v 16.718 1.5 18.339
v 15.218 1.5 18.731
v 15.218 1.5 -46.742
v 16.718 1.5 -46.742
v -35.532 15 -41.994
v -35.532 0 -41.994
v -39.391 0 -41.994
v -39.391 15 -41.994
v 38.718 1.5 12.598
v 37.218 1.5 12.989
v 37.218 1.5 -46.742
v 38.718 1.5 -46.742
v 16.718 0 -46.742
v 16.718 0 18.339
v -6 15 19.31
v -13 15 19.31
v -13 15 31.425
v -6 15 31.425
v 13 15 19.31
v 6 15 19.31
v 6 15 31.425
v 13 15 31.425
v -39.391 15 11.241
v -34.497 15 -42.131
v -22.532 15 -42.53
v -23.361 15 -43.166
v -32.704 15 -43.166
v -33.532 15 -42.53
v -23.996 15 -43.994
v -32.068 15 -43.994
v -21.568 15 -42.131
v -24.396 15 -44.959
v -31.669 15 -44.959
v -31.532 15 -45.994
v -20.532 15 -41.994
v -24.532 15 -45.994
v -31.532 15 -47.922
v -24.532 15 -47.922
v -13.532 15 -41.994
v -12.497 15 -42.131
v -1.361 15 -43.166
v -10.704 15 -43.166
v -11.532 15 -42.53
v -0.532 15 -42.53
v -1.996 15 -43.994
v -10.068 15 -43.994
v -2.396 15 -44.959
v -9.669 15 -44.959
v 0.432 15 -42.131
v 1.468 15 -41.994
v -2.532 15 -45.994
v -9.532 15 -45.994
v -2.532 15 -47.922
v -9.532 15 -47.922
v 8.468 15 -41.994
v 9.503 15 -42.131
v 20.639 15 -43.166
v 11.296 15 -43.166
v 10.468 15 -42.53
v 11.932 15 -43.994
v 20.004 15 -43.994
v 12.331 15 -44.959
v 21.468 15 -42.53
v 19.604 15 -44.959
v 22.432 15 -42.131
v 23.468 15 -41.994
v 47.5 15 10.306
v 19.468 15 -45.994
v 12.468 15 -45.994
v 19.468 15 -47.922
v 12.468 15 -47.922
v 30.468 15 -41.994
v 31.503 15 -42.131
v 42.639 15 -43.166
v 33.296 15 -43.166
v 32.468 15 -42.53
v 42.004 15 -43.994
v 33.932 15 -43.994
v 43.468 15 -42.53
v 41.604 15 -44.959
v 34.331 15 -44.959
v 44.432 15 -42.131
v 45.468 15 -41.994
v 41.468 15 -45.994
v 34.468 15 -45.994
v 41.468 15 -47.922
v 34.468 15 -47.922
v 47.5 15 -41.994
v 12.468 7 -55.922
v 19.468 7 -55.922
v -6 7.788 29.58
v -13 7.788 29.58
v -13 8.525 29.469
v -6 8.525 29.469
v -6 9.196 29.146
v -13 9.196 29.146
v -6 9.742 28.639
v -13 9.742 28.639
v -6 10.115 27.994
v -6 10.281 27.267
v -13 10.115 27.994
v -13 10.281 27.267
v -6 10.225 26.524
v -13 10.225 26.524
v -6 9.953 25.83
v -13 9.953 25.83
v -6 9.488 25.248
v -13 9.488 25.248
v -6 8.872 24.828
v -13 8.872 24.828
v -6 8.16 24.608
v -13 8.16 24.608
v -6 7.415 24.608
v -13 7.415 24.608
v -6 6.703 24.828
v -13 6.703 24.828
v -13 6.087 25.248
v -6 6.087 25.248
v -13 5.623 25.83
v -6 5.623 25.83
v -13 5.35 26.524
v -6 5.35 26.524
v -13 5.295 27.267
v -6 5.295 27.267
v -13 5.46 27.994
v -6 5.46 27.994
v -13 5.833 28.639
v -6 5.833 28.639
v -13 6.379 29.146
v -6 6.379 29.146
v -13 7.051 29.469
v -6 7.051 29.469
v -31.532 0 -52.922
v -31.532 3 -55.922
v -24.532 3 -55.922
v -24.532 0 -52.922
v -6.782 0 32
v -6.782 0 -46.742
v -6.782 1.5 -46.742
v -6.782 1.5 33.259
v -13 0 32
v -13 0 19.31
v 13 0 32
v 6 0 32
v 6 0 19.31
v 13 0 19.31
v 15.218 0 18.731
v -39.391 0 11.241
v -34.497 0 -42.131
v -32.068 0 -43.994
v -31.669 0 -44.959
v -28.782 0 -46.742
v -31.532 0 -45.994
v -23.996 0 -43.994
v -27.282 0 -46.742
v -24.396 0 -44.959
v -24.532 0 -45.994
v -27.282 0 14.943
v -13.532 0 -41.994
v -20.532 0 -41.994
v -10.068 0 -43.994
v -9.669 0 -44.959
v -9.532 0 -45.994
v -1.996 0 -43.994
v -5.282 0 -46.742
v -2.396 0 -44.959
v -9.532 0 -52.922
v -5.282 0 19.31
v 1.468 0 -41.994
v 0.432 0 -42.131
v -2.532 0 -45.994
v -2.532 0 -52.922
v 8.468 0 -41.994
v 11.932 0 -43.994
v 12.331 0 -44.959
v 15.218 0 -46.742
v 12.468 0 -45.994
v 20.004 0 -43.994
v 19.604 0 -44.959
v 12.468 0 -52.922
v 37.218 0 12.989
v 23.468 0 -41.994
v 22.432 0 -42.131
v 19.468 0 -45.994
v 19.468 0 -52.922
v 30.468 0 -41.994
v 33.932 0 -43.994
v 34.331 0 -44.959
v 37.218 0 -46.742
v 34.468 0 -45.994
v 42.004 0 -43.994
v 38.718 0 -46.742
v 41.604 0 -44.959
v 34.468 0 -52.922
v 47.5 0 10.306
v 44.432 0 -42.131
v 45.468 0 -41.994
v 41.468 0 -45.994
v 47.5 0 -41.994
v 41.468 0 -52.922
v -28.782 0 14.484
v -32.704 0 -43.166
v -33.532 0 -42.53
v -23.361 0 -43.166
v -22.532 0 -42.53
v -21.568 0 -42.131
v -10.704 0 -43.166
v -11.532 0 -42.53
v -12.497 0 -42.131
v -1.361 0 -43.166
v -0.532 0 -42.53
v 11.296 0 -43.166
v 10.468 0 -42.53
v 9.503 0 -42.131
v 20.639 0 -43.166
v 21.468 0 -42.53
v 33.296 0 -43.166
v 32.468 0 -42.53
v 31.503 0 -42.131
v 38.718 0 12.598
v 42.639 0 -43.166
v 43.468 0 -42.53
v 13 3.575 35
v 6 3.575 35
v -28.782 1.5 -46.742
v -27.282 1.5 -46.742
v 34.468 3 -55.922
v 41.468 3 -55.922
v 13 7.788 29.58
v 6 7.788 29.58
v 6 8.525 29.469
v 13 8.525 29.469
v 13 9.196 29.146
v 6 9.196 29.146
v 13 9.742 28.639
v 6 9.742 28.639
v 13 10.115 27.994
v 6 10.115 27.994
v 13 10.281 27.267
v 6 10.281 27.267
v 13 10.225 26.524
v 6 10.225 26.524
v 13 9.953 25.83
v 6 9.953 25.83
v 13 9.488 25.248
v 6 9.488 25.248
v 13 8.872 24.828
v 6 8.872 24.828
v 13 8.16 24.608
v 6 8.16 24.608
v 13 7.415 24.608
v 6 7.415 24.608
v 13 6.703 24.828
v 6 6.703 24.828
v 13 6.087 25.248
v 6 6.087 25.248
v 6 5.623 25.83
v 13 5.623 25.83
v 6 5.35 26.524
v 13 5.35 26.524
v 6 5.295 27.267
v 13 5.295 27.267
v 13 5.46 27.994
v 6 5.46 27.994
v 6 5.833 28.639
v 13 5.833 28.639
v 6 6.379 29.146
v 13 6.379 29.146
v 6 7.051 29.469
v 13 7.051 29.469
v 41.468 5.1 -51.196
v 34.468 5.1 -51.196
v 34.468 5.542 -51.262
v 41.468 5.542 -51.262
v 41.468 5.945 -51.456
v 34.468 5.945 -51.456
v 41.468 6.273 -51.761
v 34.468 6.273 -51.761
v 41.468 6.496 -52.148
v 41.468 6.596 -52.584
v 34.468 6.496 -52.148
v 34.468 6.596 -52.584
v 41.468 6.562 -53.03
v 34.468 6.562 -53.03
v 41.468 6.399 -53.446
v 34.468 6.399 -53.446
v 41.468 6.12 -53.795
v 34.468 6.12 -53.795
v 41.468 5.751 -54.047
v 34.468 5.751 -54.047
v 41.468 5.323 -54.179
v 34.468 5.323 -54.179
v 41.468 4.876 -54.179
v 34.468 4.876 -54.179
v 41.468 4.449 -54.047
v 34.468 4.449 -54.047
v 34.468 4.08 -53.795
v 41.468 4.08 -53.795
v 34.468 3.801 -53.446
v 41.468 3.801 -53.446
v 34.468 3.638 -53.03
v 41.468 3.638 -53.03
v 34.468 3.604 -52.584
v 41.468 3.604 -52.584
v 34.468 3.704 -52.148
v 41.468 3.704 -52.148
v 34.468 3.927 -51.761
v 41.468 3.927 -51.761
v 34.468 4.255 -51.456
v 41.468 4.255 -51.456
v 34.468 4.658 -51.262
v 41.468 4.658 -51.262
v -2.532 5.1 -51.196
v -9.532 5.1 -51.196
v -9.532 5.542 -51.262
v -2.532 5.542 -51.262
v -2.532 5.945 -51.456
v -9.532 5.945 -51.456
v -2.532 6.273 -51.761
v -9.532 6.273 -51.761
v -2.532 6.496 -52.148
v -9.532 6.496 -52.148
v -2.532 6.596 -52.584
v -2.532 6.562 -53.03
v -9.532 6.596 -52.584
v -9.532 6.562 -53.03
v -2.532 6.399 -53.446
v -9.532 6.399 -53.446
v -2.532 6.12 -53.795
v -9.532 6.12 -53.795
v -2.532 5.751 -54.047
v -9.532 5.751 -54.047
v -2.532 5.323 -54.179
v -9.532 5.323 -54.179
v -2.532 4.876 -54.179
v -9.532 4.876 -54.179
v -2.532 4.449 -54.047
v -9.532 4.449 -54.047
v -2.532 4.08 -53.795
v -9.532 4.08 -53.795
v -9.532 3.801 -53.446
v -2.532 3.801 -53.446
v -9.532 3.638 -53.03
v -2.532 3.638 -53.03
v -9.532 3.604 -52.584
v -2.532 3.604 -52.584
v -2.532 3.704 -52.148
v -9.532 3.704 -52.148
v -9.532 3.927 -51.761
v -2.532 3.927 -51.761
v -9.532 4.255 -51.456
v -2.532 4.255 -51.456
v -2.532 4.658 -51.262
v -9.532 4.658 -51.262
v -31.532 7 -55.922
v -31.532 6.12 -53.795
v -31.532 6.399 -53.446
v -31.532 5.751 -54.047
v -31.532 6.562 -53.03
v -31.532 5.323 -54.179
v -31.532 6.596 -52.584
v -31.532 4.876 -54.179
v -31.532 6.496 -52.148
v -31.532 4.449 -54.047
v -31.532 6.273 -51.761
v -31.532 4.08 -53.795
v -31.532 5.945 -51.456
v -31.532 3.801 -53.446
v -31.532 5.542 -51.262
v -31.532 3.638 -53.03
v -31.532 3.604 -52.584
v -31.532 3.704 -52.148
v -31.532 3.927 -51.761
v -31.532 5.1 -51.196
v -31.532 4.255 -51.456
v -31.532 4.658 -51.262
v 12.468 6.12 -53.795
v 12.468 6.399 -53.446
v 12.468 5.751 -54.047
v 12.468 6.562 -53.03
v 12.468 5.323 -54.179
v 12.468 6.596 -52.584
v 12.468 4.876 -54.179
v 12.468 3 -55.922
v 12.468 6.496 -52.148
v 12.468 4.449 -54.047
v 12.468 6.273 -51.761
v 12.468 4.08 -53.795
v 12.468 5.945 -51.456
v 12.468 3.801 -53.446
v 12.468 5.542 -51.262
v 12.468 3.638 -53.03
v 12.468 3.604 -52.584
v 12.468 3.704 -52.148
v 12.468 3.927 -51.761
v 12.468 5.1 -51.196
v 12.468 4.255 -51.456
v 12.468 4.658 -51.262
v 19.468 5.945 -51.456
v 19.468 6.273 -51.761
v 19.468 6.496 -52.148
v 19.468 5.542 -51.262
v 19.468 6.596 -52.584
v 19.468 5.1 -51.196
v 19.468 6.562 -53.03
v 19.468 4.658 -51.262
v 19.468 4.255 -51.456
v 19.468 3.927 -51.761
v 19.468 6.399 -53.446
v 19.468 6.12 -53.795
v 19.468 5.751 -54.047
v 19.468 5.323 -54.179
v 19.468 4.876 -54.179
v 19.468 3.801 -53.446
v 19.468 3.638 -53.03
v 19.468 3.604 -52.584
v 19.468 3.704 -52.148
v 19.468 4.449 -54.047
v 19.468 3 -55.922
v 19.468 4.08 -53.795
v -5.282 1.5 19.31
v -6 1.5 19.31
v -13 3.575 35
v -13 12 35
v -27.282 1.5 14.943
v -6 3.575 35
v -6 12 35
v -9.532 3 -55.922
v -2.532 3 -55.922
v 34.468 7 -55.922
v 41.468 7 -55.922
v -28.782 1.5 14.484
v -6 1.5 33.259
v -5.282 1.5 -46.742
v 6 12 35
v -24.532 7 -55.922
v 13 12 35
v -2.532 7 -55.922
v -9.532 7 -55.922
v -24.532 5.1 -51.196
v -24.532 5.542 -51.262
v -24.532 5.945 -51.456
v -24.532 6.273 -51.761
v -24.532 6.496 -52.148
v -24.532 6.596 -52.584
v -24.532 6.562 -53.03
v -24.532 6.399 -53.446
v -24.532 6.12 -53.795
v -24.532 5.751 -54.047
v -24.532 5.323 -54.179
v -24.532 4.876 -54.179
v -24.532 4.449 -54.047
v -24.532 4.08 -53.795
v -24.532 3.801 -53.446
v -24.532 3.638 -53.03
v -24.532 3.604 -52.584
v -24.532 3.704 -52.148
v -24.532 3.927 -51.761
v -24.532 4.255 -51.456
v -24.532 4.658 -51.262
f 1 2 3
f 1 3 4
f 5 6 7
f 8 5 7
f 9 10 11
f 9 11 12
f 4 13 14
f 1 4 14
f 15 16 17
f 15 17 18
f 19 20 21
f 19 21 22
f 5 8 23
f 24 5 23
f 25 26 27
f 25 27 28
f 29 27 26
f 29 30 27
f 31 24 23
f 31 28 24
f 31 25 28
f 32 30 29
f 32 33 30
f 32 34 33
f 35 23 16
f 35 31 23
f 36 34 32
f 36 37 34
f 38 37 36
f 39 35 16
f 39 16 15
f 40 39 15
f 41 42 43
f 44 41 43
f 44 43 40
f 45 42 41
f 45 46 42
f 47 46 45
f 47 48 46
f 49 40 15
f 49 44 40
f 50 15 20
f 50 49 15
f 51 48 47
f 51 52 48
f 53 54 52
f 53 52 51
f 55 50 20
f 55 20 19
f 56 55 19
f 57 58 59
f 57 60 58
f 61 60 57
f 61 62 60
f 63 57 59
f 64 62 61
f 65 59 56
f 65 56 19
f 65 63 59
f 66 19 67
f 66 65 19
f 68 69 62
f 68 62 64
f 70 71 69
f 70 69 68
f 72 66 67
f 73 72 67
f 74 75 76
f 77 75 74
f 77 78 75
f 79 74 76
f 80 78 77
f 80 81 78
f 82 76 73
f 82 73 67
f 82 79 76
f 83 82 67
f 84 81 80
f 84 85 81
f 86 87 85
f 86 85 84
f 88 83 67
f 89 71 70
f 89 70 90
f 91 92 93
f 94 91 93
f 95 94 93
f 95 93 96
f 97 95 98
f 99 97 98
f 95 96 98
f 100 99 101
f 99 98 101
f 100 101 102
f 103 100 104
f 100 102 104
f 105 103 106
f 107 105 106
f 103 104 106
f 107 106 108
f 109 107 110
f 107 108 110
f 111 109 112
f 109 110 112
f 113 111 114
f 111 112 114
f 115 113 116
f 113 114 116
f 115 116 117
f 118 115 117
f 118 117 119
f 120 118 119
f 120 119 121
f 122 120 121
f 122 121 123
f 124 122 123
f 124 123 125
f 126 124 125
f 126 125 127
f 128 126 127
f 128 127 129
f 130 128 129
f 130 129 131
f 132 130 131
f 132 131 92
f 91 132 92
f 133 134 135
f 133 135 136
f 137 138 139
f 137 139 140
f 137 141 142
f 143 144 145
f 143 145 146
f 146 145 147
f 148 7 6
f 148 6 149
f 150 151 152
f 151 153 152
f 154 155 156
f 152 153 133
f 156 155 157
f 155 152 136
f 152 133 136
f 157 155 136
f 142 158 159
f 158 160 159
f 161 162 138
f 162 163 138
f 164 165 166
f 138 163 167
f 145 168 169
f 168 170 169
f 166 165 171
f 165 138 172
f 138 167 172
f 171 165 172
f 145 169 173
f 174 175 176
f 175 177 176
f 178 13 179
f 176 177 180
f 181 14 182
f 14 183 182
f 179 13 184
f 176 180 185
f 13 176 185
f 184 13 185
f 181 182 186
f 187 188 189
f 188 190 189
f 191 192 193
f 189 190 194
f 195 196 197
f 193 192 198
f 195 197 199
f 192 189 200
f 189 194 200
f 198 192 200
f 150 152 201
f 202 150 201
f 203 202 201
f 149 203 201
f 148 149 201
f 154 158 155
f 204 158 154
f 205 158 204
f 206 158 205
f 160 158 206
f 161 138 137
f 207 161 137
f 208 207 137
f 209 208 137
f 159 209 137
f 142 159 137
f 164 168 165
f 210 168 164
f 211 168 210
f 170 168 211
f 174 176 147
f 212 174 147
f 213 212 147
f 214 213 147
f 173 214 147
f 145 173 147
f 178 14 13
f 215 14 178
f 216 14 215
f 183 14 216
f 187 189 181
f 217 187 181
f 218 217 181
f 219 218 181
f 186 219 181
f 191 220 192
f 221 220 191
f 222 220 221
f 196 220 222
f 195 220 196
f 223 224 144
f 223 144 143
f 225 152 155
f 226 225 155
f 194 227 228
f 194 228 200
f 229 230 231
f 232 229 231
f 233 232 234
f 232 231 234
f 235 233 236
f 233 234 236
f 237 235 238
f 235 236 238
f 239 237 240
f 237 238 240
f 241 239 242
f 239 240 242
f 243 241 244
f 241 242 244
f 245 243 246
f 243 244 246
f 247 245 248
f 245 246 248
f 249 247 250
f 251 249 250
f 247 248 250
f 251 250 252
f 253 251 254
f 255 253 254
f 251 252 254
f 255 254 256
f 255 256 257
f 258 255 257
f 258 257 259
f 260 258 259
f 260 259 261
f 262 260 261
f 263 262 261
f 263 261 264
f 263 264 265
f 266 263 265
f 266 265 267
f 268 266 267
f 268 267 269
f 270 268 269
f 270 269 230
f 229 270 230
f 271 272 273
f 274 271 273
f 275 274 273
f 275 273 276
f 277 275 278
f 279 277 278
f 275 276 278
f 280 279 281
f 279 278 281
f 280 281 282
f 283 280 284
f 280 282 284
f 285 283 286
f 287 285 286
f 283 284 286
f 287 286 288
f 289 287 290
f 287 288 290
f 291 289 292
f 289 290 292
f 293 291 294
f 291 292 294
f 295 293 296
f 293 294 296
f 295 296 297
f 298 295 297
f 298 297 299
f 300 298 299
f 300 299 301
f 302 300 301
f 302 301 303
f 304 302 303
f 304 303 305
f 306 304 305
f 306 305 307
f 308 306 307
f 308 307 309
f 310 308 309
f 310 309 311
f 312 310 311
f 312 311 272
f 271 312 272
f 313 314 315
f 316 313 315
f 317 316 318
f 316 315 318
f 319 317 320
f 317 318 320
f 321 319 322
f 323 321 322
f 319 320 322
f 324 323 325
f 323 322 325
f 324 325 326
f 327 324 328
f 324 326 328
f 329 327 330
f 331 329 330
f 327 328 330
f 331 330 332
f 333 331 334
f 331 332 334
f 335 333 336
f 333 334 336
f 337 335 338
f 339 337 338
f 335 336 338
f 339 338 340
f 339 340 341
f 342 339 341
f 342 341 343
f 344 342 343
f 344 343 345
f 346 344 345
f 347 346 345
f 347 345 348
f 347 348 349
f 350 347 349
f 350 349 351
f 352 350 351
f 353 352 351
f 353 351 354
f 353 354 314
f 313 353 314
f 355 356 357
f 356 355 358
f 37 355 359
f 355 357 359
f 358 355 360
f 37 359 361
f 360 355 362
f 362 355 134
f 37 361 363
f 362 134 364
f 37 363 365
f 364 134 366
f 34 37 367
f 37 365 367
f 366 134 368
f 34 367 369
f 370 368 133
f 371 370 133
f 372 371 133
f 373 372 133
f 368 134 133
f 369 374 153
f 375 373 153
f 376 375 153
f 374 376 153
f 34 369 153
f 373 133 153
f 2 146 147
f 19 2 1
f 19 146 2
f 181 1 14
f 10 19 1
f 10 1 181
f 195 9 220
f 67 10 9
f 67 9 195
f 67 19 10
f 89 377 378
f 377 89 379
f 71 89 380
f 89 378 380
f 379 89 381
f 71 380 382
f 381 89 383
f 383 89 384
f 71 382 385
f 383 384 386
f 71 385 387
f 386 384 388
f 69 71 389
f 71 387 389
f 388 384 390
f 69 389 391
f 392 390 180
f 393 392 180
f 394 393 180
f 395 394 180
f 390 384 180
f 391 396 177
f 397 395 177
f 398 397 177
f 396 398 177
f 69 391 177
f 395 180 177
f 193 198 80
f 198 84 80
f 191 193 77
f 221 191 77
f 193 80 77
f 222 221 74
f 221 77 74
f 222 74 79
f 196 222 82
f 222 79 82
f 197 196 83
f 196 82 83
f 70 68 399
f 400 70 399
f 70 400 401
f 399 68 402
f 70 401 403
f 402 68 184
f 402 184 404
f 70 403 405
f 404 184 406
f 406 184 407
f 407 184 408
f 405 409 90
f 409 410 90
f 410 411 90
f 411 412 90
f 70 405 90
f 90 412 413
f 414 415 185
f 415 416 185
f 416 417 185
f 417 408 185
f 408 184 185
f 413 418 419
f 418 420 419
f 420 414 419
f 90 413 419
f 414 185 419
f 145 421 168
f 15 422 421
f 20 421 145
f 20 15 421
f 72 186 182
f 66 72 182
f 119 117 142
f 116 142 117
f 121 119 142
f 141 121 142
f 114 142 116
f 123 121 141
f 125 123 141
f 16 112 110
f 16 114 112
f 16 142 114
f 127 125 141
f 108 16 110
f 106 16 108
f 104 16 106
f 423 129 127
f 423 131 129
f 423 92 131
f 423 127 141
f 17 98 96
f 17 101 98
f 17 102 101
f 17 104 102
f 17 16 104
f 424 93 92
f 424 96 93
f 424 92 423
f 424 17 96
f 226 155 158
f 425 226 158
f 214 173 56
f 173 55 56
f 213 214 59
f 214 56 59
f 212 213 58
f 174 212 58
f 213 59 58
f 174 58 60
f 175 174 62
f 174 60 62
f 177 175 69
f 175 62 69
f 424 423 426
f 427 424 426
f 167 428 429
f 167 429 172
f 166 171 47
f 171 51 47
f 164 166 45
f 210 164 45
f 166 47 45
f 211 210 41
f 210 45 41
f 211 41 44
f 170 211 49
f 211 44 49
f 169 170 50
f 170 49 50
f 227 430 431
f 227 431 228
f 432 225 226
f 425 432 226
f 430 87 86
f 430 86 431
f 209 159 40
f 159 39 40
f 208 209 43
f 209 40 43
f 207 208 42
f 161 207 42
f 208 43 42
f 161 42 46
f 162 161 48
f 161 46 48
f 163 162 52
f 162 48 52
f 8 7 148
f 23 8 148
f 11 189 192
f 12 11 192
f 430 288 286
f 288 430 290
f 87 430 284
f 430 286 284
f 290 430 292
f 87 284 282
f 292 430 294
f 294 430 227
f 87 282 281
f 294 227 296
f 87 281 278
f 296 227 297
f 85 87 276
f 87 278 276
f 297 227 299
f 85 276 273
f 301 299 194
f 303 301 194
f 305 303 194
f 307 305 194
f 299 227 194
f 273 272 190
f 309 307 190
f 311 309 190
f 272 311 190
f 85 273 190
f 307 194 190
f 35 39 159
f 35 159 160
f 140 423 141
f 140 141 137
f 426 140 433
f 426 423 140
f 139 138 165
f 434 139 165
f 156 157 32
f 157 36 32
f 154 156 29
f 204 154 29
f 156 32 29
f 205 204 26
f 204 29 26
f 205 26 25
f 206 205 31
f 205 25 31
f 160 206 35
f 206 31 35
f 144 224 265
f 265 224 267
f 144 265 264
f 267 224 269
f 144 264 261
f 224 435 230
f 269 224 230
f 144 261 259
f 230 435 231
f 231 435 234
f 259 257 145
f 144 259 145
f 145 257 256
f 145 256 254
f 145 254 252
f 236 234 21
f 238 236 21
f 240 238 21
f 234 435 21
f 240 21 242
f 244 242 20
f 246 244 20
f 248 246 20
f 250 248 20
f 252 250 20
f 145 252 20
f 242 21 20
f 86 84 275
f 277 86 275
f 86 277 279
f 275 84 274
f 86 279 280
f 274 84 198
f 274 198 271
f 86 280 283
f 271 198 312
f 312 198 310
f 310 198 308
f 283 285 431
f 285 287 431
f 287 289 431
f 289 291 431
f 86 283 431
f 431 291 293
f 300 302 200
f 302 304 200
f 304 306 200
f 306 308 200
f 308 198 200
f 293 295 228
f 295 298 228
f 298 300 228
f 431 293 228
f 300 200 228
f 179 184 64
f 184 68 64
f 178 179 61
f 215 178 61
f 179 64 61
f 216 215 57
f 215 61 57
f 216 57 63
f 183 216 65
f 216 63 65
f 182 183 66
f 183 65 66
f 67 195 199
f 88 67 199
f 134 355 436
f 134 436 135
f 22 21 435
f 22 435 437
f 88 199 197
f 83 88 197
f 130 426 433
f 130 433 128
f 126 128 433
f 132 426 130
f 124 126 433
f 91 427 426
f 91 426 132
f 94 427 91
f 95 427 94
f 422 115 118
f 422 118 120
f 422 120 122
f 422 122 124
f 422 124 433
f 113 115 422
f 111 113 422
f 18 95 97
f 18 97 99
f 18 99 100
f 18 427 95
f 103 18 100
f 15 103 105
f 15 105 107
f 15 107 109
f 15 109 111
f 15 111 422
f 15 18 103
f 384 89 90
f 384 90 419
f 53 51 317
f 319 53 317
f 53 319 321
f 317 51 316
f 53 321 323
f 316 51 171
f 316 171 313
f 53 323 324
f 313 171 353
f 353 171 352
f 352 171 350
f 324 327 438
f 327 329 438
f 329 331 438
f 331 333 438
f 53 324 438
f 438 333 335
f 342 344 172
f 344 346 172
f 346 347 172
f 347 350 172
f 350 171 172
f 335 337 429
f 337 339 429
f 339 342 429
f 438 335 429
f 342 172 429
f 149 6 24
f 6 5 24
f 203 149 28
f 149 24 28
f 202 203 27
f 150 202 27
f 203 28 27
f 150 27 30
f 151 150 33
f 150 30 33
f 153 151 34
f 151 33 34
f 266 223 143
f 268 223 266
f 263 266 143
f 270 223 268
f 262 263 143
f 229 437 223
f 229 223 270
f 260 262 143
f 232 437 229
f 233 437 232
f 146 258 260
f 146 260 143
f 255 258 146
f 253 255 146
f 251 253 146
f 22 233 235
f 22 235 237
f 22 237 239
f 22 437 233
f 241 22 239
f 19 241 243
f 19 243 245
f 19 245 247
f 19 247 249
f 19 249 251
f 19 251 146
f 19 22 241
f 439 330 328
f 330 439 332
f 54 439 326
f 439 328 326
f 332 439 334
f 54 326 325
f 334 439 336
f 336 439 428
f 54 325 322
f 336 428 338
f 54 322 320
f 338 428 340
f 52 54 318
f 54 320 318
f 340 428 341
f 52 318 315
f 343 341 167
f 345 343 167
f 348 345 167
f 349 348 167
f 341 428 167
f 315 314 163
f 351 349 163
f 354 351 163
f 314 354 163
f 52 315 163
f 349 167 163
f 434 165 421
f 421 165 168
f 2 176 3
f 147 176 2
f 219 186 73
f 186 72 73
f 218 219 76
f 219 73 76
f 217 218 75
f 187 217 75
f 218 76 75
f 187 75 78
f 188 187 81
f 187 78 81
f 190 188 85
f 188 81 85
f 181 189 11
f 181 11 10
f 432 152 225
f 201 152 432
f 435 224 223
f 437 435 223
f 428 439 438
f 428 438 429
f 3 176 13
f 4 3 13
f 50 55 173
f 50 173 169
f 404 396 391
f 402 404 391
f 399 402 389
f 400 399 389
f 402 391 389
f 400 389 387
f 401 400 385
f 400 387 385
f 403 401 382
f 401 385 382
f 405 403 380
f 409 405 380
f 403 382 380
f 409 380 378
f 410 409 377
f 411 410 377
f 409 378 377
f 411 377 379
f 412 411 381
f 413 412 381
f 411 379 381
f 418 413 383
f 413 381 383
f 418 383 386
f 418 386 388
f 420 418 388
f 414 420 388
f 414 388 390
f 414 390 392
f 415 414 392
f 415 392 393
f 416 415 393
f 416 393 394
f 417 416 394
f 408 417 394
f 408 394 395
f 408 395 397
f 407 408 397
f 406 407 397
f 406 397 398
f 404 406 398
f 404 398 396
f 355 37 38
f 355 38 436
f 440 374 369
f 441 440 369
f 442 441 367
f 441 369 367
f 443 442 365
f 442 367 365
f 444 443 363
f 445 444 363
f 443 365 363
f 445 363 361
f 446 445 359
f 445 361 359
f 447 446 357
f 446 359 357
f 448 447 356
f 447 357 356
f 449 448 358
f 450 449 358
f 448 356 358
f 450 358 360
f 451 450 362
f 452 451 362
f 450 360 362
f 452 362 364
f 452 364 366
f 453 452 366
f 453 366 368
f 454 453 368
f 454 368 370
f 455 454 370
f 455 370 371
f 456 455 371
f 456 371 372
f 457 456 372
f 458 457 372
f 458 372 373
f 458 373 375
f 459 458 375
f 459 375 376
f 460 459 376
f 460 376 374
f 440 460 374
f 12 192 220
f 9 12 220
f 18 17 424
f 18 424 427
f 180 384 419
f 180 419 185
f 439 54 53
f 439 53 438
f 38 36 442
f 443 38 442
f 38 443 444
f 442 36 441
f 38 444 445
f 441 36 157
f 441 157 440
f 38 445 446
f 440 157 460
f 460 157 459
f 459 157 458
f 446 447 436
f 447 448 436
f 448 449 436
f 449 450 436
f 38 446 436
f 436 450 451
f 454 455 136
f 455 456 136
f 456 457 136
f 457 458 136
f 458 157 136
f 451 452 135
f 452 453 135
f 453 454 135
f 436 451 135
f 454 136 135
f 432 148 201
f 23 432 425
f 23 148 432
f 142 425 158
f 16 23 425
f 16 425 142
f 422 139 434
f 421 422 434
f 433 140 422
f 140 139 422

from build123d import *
from OCP.BRepFilletAPI import BRepFilletAPI_MakeChamfer

# Parameters (mm, degrees)
EXTRUDE_1_DEPTH       = 15
SKETCH_2_W            = 12
SKETCH_2_H            = 31.380738368
CUT_EXTRUDE_2_DEPTH   = 78.211371281
CHAMFER_1_SIZE        = 3
CHAMFER_1_SIZE2       = 3.575260778
SKETCH_4_R            = 2.5
CUT_EXTRUDE_3_DEPTH   = 86.823049672
SKETCH_8_R            = 1.5
CUT_EXTRUDE_3_2_DEPTH = 100.757006451
CUT_EXTRUDE_4_DEPTH   = 100.757006451
SKETCH_11_W           = 1.5
SKETCH_11_H           = 83.943010544
SKETCH_11_H_2         = 90.462059893
CUT_EXTRUDE_6_DEPTH   = 1.5
FILLET_7_R            = 4


with BuildPart() as part:
    # Эскиз1 → Вытянуть1 (new body)
    with BuildSketch(Plane(origin=(0, 0, 0), x_dir=(1, 0, 0), z_dir=(0, 1, 0))):
        Polygon((-39.391292545, -35), (47.5, -35), (47.5, 41.994456138), (41.467636093, 41.994456138), (41.467636093, 58.994456138), (34.467636093, 58.994456138), (34.467636093, 41.994456138), (19.467636417, 41.994456138), (19.467636417, 58.994456138), (12.467636275, 58.994456138), (12.467636275, 41.994456138), (-2.532363543, 41.994456138), (-2.532363543, 58.994456138), (-9.532363543, 58.994456138), (-9.532363543, 41.994456138), (-24.532363361, 41.994456138), (-24.532363361, 58.994456138), (-31.532363503, 58.994456138), (-31.532363503, 41.994456138), (-39.391292545, 41.994456138), align=None)
    extrude(amount=EXTRUDE_1_DEPTH)

    # Эскиз2 → Вытянуть2 (cut, through all)
    with BuildSketch(Plane(origin=(0, 15, 0), x_dir=(1, 0, 0), z_dir=(0, 1, 0))):
        with Locations((0, -35)):
            Rectangle(SKETCH_2_W, SKETCH_2_H)
        Polygon((-40.282255649, -10.968321), (-13, -19.309630816), (-13, -35), (-40.282255649, -35), align=None)
        Polygon((49.575798338, -35), (13, -35), (13, -19.309630816), (49.575798338, -9.764075531), align=None)
    extrude(amount=-CUT_EXTRUDE_2_DEPTH, mode=Mode.SUBTRACT)

    # Фаска1: one chamfer whose edges measure the first distance from different faces: ONE call of the kernel's chamfer builder (chamfer() names one face for all edges)
    chamfer_1_edges_1 = [part.edges().sort_by_distance(p)[0] for p in [
        (9.5, 0, 35),
        (-9.5, 0, 35),
    ]]
    chamfer_1_side_1 = [part.faces().sort_by_distance(p)[0] for p in [
        (3.754326558, 0, -14.37188085),
    ]]
    chamfer_1_edges_2 = [part.edges().sort_by_distance(p)[0] for p in [
        (9.5, 15, 35),
    ]]
    chamfer_1_side_2 = [part.faces().sort_by_distance(p)[0] for p in [
        (9.5, 7.5, 35),
    ]]
    chamfer_1_edges_3 = [part.edges().sort_by_distance(p)[0] for p in [
        (-9.5, 15, 35),
    ]]
    chamfer_1_side_3 = [part.faces().sort_by_distance(p)[0] for p in [
        (-9.5, 7.5, 35),
    ]]
    chamfer_1 = BRepFilletAPI_MakeChamfer(part.part.solid().wrapped)
    for e in chamfer_1_edges_1:
        chamfer_1.Add(CHAMFER_1_SIZE, CHAMFER_1_SIZE2, e.wrapped, chamfer_1_side_1[0].wrapped)  # the first distance lies on this face
    for e in chamfer_1_edges_2:
        chamfer_1.Add(CHAMFER_1_SIZE, CHAMFER_1_SIZE2, e.wrapped, chamfer_1_side_2[0].wrapped)  # the first distance lies on this face
    for e in chamfer_1_edges_3:
        chamfer_1.Add(CHAMFER_1_SIZE, CHAMFER_1_SIZE2, e.wrapped, chamfer_1_side_3[0].wrapped)  # the first distance lies on this face
    add(Compound.cast(chamfer_1.Shape()), mode=Mode.REPLACE)

    # Эскиз4 → Cut-Extrude 3 (cut, through all)
    with BuildSketch(Plane.ZY.offset(13)):
        with Locations((27.080154825, 7.787630389)):
            Circle(SKETCH_4_R)
    extrude(amount=-CUT_EXTRUDE_3_DEPTH, mode=Mode.SUBTRACT)

    # Эскиз8 → Cut-Extrude 3 2 (cut, through all)
    with BuildSketch(Plane.ZY.offset(31.532363503)):
        with Locations((-52.695808176, 5.099933888)):
            Circle(SKETCH_8_R)
    extrude(amount=-CUT_EXTRUDE_3_2_DEPTH, mode=Mode.SUBTRACT)

    # Эскиз9 → Вырез-Вытянуть4 (cut, through all)
    with BuildSketch(Plane.ZY.offset(31.532363503)):
        Polygon((-47.921961808, 15), (-55.921789721, 7.000172087), (-55.921789721, 3.000172087), (-52.921609925, -7.709e-06), (-58.994456138, -7.709e-06), (-58.994456138, 15), align=None)
    extrude(amount=-CUT_EXTRUDE_4_DEPTH, mode=Mode.SUBTRACT)

    # Эскиз11 → Вырез-Вытянуть6 (cut)
    with BuildSketch(Plane.XZ):
        with Locations((37.967637049, -4.77082371)):
            Rectangle(SKETCH_11_W, SKETCH_11_H)
        with Locations((-6.032362804, -4.77082371)):
            Rectangle(SKETCH_11_W, SKETCH_11_H)
        with Locations((15.967637122, -1.511299036)):
            Rectangle(SKETCH_11_W, SKETCH_11_H_2)
        with Locations((-28.032362511, -1.511299036)):
            Rectangle(SKETCH_11_W, SKETCH_11_H_2)
    extrude(amount=-CUT_EXTRUDE_6_DEPTH, mode=Mode.SUBTRACT)

    # Скругление7
    fillet_7_edges = [part.edges().sort_by_distance(p)[0] for p in [
        (41.467636093, 7.5, -41.994456138),
        (34.467636093, 7.5, -41.994456138),
        (19.467636417, 7.5, -41.994456138),
        (12.467636275, 7.5, -41.994456138),
        (-2.532363543, 7.5, -41.994456138),
        (-9.532363543, 7.5, -41.994456138),
        (-24.532363361, 7.5, -41.994456138),
        (-31.532363503, 7.5, -41.994456138),
    ]]
    fillet(fillet_7_edges, radius=FILLET_7_R)


solid = part.part
